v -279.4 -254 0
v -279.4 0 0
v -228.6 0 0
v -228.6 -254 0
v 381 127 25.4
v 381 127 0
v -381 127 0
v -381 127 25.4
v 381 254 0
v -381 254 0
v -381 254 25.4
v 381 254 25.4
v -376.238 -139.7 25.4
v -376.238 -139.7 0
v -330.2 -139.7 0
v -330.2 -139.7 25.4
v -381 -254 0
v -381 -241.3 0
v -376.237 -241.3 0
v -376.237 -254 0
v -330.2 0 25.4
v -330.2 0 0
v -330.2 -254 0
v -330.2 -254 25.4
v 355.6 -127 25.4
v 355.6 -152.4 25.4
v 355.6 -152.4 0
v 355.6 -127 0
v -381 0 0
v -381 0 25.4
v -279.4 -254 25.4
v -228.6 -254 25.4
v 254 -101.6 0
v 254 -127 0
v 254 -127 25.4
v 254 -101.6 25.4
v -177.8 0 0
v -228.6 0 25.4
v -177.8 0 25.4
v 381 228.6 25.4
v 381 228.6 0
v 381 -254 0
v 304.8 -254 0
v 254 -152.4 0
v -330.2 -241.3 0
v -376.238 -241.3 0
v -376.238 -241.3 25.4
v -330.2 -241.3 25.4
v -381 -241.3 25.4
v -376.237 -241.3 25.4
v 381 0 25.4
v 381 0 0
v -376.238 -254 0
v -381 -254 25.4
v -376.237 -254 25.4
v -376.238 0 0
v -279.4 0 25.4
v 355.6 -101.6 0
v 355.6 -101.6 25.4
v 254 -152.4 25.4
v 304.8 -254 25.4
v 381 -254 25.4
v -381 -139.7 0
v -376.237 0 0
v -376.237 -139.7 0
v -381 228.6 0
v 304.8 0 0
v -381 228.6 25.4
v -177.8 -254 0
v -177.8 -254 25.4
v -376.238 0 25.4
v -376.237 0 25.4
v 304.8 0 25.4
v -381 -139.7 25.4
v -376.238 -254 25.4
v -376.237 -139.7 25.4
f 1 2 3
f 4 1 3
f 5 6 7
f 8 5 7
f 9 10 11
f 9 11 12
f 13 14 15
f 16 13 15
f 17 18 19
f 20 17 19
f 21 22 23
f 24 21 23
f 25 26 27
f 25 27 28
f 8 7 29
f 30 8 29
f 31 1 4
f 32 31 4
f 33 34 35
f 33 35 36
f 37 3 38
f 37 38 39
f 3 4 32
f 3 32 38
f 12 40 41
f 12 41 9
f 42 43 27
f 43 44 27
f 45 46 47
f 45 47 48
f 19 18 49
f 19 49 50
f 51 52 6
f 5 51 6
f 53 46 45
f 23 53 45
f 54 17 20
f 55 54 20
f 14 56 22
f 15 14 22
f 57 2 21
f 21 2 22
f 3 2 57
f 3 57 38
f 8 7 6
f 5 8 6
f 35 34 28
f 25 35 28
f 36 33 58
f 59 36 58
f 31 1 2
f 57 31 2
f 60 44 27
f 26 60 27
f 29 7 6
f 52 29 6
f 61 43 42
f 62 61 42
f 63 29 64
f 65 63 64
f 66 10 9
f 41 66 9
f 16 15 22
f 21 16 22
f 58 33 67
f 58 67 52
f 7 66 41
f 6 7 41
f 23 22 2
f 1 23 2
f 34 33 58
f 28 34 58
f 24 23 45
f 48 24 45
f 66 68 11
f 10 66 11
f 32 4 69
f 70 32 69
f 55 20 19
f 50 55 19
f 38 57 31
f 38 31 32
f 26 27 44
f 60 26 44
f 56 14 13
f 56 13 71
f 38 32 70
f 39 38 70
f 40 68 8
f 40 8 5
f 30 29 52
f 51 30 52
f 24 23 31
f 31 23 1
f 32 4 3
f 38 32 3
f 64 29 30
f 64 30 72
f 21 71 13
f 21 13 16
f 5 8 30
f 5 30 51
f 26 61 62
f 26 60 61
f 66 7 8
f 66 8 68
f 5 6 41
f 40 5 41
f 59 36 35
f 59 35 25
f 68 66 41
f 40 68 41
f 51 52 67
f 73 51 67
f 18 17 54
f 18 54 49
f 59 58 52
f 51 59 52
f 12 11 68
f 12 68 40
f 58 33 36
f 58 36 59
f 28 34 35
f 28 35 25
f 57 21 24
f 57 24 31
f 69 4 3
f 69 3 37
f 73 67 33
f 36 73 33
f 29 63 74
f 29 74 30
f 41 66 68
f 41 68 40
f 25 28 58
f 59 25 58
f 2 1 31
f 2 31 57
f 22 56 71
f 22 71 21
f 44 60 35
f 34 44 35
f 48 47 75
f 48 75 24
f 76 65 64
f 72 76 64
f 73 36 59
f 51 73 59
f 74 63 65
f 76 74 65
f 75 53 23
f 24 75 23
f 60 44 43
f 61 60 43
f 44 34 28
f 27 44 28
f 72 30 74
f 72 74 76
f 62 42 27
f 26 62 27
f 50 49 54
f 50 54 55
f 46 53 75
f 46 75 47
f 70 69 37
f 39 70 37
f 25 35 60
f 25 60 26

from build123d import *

# Parameters (mm, degrees)
F0_W     = 762
F0_H     = 25.4
F0_W_2   = 101.6
F0_W_3   = 46.0375
F0_H_2   = 12.7
F1_DEPTH = 25.4
F0_H_3   = 101.6
F0_W_4   = 50.8
F0_H_4   = 254
F0_W_5   = 4.7625
F0_H_5   = 139.7
F2_DEPTH = 25.4
F3_DEPTH = 25.4


with BuildPart() as f1:
    # F0 (on Top) → F1 (new body)
    with BuildSketch(Plane.XY):
        Polygon((304.8, -254), (381, -254), (355.6, -152.4), (254, -152.4), align=None)
        with Locations((0, 241.3)):
            Rectangle(F0_W, F0_H)
        Polygon((381, 127), (-381, 127), (-381, 0), (-376.2375, 0), (-330.2, 0), (-279.4, 0), (-228.6, 0), (-177.8, 0), (304.8, 0), (381, 0), align=None)
        with Locations((304.8, -114.3)):
            Rectangle(F0_W_2, F0_H)
        with Locations((-353.21875, -247.65)):
            Rectangle(F0_W_3, F0_H_2)
    extrude(amount=F1_DEPTH)


with BuildPart() as f2:
    # F0 (on Top) → F2 (new body)
    with BuildSketch(Plane.XY):
        Polygon((355.6, -101.6), (381, 0), (304.8, 0), (254, -101.6), align=None)
        with Locations((0, 177.8)):
            Rectangle(F0_W, F0_H_3)
        with Locations((-203.2, -127)):
            Rectangle(F0_W_4, F0_H_4)
        Polygon((-279.4, 0), (-330.2, 0), (-330.2, -139.7), (-330.2, -241.3), (-330.2, -254), (-279.4, -254), align=None)
        with Locations((-378.61875, -69.85)):
            Rectangle(F0_W_5, F0_H_5)
        with Locations((-378.61875, -247.65)):
            Rectangle(F0_W_5, F0_H_2)
        with Locations((304.8, -139.7)):
            Rectangle(F0_W_2, F0_H)
    extrude(amount=F2_DEPTH)


with BuildPart() as f3:
    # F0 (on Top) → F3 (new body)
    with BuildSketch(Plane.XY):
        with Locations((-254, -127)):
            Rectangle(F0_W_4, F0_H_4)
        with Locations((-353.21875, -69.85)):
            Rectangle(F0_W_3, F0_H_5)
    extrude(amount=F3_DEPTH)


solid = Compound([f1.part, f2.part, f3.part])
